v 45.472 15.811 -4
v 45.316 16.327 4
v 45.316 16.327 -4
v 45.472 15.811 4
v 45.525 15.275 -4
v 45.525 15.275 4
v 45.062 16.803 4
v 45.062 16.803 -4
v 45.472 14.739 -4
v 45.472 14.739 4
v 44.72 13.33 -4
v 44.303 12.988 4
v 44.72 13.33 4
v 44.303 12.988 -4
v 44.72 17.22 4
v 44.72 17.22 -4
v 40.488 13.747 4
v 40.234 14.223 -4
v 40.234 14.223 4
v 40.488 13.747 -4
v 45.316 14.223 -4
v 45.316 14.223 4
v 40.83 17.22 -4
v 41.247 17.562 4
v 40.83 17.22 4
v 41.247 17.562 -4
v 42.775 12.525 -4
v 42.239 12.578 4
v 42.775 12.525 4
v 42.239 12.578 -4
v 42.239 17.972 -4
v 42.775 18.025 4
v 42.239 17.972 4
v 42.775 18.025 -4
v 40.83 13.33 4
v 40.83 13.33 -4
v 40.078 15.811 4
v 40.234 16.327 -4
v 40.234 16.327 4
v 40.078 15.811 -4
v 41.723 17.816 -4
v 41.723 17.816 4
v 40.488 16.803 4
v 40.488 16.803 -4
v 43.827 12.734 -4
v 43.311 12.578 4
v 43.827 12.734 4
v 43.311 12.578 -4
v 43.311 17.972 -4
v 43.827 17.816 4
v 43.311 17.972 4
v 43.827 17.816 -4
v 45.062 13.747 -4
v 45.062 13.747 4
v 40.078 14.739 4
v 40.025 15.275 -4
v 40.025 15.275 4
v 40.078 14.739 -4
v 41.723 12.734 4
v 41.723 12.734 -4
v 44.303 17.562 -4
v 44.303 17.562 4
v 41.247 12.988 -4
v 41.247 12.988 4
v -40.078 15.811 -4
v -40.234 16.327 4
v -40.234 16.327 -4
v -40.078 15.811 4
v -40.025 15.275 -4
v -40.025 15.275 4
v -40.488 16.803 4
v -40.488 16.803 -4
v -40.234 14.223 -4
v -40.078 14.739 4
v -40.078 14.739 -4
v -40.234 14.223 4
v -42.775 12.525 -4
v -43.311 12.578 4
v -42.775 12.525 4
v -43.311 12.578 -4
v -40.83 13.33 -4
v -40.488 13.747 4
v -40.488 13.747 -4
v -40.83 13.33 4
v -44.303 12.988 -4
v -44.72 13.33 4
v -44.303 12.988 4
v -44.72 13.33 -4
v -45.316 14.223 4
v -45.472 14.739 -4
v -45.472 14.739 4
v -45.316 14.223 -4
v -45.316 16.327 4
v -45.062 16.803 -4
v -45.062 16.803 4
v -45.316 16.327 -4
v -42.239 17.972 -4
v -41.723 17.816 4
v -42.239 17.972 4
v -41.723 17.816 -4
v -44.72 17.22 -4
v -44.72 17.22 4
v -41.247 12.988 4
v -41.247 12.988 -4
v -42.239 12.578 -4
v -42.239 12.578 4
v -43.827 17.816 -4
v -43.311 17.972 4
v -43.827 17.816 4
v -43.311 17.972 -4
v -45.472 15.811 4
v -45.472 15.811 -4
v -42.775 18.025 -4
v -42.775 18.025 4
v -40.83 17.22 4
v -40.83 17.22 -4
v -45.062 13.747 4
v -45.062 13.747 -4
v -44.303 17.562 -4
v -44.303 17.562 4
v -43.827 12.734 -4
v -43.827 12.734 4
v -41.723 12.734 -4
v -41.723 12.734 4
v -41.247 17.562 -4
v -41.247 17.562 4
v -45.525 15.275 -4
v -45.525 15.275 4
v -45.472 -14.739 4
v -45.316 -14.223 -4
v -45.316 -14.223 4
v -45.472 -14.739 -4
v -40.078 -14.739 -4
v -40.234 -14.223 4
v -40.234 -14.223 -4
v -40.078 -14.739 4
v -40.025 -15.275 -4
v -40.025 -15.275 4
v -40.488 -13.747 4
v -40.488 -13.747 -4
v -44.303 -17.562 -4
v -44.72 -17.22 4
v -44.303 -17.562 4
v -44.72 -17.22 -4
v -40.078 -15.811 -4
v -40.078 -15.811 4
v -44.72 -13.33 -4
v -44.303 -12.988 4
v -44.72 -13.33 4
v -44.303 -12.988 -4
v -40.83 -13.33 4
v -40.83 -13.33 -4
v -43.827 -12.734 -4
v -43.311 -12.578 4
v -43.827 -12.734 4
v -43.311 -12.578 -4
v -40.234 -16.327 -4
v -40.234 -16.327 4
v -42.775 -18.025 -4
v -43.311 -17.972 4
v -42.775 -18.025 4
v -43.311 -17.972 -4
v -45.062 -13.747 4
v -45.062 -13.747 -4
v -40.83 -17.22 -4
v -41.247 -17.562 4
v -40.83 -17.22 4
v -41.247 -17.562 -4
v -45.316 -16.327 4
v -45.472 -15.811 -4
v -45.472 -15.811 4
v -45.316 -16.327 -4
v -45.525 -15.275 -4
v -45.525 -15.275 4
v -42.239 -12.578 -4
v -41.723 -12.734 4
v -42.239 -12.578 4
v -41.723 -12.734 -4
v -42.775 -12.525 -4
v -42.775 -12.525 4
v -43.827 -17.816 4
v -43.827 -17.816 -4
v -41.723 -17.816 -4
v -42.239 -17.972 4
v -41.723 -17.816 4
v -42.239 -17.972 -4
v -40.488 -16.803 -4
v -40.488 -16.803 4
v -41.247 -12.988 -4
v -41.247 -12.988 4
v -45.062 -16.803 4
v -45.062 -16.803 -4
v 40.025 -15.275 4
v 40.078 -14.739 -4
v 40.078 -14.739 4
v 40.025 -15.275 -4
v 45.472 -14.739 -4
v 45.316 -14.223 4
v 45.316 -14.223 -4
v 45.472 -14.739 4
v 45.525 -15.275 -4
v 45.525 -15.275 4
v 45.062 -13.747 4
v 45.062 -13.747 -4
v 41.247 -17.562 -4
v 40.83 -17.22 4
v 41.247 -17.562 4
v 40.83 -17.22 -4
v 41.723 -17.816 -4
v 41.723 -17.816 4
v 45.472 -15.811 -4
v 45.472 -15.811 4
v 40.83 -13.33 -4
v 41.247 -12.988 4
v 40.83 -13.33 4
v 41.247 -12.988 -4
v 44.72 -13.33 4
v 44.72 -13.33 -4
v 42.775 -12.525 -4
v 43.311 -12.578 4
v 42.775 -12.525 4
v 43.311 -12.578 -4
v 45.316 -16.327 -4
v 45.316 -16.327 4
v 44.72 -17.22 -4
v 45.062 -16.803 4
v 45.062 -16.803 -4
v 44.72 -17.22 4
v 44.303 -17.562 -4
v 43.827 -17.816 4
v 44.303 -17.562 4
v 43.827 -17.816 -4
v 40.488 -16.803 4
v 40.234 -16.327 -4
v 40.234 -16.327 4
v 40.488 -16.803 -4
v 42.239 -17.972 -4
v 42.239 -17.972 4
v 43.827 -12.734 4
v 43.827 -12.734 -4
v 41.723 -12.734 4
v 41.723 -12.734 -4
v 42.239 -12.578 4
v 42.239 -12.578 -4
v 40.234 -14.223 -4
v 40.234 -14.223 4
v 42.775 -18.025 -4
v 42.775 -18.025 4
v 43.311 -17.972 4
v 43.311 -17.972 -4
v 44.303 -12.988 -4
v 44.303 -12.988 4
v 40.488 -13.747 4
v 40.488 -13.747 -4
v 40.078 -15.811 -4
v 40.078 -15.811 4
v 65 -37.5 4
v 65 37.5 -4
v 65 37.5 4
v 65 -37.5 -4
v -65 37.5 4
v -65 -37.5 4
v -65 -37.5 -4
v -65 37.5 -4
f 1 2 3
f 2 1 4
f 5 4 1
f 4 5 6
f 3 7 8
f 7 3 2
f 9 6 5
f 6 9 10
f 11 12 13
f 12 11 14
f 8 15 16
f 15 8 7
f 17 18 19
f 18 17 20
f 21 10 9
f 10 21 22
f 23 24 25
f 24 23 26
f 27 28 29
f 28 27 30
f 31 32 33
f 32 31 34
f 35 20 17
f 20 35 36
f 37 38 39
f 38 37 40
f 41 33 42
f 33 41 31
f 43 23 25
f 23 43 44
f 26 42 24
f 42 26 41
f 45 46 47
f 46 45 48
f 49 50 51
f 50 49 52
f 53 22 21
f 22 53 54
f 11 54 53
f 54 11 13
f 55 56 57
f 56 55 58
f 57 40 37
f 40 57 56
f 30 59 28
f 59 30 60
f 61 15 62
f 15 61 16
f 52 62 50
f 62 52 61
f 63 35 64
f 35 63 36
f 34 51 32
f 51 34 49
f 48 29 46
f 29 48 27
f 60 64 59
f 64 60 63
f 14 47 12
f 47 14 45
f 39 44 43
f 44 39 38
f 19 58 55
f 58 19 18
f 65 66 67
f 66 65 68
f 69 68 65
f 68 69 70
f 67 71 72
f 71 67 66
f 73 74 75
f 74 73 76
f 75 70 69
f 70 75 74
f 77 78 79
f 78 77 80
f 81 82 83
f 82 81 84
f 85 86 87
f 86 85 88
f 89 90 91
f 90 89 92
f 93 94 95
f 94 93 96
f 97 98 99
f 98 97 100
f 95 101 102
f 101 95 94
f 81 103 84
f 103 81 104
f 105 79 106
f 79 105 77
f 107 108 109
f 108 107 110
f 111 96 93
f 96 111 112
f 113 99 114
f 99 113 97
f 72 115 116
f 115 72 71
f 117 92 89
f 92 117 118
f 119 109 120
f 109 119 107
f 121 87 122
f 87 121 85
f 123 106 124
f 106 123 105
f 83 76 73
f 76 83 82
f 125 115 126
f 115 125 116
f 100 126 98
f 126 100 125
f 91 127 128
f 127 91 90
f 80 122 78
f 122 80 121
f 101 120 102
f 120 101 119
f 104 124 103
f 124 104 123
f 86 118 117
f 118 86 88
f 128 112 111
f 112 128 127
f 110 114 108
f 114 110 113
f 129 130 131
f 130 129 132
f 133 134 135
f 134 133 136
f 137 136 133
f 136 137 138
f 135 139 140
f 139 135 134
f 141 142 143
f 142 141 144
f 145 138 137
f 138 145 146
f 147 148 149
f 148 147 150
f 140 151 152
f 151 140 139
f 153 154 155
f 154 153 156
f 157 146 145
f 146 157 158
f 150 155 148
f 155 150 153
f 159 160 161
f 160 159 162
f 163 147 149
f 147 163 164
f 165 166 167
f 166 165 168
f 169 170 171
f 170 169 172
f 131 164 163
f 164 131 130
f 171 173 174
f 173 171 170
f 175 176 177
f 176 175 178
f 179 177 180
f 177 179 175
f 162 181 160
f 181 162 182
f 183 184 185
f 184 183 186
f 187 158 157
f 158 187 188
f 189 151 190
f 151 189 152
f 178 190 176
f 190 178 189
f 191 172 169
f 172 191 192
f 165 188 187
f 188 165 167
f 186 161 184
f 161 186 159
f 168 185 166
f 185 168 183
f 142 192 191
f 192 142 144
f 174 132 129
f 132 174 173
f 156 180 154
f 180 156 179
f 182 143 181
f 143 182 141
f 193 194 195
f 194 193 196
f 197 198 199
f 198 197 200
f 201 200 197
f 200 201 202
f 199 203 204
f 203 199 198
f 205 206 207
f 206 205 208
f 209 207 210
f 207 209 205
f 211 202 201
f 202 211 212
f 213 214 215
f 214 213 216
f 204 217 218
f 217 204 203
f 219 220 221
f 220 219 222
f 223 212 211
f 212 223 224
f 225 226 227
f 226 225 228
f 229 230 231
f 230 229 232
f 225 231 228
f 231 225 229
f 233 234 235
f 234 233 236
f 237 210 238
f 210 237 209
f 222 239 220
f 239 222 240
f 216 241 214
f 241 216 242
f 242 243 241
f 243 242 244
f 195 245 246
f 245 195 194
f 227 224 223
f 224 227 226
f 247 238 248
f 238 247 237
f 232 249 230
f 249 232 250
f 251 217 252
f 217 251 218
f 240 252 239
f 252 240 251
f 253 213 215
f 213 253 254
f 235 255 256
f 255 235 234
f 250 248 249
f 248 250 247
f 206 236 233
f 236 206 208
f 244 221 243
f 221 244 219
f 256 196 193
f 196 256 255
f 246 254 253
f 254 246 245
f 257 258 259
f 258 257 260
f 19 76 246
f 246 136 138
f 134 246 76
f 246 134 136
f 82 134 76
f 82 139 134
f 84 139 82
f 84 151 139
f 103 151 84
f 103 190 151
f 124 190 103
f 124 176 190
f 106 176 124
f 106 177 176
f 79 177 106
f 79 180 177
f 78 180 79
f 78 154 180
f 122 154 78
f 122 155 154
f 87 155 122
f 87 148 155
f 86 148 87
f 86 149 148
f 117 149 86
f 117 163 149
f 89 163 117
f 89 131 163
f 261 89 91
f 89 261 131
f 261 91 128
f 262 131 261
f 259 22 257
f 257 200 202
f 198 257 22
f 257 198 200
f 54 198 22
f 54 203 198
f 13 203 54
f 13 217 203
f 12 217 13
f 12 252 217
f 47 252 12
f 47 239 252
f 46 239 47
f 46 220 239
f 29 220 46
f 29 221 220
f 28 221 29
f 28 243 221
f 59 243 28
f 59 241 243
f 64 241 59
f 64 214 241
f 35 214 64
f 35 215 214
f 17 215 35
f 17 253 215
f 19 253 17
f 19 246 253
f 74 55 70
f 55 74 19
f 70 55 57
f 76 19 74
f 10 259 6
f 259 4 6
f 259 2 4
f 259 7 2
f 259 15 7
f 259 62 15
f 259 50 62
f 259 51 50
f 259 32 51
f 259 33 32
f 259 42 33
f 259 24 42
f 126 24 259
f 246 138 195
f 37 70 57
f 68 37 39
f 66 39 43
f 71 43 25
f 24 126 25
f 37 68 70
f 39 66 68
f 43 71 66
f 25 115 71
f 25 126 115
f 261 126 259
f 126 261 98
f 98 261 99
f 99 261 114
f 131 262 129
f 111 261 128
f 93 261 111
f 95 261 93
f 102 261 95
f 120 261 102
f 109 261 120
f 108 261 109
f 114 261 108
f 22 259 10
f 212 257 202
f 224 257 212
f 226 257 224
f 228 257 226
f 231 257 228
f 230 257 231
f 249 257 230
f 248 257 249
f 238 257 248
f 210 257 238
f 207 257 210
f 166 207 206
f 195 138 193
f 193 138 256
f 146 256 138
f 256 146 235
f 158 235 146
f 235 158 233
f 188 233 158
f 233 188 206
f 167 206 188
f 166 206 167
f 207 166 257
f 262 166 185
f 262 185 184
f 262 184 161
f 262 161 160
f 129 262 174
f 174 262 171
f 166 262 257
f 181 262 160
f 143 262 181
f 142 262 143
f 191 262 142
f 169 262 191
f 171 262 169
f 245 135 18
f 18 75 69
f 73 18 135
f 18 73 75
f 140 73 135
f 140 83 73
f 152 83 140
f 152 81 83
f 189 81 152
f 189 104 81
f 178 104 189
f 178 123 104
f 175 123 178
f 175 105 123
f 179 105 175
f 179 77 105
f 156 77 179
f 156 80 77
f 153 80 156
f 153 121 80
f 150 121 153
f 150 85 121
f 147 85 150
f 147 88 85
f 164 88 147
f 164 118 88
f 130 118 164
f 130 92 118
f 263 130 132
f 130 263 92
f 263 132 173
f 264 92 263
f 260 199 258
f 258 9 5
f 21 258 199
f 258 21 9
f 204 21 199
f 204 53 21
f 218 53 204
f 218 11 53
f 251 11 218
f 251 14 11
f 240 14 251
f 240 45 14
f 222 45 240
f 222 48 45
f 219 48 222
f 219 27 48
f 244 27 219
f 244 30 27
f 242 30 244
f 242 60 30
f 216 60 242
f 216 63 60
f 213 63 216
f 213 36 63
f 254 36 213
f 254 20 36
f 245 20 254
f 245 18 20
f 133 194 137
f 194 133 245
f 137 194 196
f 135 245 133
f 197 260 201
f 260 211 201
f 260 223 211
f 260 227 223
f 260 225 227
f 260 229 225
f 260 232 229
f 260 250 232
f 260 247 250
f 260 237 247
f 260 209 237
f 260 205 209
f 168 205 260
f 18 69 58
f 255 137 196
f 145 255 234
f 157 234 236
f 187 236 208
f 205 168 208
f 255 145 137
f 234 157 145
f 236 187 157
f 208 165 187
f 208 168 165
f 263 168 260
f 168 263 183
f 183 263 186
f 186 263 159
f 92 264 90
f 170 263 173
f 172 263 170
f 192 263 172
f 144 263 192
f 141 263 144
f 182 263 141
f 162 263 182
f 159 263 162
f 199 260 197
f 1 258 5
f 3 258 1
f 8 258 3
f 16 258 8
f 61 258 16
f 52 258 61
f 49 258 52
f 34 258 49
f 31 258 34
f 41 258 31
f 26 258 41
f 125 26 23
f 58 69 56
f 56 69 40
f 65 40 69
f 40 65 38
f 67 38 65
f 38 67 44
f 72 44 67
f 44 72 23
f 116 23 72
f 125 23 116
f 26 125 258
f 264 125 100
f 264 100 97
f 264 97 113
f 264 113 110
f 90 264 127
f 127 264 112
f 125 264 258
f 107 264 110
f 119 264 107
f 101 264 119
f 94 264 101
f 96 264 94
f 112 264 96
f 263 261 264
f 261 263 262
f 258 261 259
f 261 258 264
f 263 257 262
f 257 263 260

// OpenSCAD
$fn = 32;

// ----------------------------------------------------------------------
// Corner plate 130 x 75 x 8
// 4 holes, centres taken from the edge offset
// ----------------------------------------------------------------------

// --- parameters (mm) ---
plate = [130, 75, 8];  // overall size (x, y, z)
holes = 4;             // number of holes the drawing asks for
hole_d = 5.5;          // hole diameter
edge = 22.225;         // hole centre offset from the plate edge

// --- derived feature positions (mm) ---
corner_x = plate[0] / 2 - edge;  // = 42.77   corner hole X
corner_y = plate[1] / 2 - edge;  // = 15.28   corner hole Y
feature_centers = [
  [corner_x, corner_y],
  [-corner_x, corner_y],
  [-corner_x, -corner_y],
  [corner_x, -corner_y]
];   // hole centres the loop below drills

// plate outline, every hole drilled through with the same cutters
difference() {
  cube(plate, center = true);
  for (centre = feature_centers)
    translate([centre[0], centre[1], 0])
      cylinder(d = hole_d, h = plate[2] + 2, center = true);
}
